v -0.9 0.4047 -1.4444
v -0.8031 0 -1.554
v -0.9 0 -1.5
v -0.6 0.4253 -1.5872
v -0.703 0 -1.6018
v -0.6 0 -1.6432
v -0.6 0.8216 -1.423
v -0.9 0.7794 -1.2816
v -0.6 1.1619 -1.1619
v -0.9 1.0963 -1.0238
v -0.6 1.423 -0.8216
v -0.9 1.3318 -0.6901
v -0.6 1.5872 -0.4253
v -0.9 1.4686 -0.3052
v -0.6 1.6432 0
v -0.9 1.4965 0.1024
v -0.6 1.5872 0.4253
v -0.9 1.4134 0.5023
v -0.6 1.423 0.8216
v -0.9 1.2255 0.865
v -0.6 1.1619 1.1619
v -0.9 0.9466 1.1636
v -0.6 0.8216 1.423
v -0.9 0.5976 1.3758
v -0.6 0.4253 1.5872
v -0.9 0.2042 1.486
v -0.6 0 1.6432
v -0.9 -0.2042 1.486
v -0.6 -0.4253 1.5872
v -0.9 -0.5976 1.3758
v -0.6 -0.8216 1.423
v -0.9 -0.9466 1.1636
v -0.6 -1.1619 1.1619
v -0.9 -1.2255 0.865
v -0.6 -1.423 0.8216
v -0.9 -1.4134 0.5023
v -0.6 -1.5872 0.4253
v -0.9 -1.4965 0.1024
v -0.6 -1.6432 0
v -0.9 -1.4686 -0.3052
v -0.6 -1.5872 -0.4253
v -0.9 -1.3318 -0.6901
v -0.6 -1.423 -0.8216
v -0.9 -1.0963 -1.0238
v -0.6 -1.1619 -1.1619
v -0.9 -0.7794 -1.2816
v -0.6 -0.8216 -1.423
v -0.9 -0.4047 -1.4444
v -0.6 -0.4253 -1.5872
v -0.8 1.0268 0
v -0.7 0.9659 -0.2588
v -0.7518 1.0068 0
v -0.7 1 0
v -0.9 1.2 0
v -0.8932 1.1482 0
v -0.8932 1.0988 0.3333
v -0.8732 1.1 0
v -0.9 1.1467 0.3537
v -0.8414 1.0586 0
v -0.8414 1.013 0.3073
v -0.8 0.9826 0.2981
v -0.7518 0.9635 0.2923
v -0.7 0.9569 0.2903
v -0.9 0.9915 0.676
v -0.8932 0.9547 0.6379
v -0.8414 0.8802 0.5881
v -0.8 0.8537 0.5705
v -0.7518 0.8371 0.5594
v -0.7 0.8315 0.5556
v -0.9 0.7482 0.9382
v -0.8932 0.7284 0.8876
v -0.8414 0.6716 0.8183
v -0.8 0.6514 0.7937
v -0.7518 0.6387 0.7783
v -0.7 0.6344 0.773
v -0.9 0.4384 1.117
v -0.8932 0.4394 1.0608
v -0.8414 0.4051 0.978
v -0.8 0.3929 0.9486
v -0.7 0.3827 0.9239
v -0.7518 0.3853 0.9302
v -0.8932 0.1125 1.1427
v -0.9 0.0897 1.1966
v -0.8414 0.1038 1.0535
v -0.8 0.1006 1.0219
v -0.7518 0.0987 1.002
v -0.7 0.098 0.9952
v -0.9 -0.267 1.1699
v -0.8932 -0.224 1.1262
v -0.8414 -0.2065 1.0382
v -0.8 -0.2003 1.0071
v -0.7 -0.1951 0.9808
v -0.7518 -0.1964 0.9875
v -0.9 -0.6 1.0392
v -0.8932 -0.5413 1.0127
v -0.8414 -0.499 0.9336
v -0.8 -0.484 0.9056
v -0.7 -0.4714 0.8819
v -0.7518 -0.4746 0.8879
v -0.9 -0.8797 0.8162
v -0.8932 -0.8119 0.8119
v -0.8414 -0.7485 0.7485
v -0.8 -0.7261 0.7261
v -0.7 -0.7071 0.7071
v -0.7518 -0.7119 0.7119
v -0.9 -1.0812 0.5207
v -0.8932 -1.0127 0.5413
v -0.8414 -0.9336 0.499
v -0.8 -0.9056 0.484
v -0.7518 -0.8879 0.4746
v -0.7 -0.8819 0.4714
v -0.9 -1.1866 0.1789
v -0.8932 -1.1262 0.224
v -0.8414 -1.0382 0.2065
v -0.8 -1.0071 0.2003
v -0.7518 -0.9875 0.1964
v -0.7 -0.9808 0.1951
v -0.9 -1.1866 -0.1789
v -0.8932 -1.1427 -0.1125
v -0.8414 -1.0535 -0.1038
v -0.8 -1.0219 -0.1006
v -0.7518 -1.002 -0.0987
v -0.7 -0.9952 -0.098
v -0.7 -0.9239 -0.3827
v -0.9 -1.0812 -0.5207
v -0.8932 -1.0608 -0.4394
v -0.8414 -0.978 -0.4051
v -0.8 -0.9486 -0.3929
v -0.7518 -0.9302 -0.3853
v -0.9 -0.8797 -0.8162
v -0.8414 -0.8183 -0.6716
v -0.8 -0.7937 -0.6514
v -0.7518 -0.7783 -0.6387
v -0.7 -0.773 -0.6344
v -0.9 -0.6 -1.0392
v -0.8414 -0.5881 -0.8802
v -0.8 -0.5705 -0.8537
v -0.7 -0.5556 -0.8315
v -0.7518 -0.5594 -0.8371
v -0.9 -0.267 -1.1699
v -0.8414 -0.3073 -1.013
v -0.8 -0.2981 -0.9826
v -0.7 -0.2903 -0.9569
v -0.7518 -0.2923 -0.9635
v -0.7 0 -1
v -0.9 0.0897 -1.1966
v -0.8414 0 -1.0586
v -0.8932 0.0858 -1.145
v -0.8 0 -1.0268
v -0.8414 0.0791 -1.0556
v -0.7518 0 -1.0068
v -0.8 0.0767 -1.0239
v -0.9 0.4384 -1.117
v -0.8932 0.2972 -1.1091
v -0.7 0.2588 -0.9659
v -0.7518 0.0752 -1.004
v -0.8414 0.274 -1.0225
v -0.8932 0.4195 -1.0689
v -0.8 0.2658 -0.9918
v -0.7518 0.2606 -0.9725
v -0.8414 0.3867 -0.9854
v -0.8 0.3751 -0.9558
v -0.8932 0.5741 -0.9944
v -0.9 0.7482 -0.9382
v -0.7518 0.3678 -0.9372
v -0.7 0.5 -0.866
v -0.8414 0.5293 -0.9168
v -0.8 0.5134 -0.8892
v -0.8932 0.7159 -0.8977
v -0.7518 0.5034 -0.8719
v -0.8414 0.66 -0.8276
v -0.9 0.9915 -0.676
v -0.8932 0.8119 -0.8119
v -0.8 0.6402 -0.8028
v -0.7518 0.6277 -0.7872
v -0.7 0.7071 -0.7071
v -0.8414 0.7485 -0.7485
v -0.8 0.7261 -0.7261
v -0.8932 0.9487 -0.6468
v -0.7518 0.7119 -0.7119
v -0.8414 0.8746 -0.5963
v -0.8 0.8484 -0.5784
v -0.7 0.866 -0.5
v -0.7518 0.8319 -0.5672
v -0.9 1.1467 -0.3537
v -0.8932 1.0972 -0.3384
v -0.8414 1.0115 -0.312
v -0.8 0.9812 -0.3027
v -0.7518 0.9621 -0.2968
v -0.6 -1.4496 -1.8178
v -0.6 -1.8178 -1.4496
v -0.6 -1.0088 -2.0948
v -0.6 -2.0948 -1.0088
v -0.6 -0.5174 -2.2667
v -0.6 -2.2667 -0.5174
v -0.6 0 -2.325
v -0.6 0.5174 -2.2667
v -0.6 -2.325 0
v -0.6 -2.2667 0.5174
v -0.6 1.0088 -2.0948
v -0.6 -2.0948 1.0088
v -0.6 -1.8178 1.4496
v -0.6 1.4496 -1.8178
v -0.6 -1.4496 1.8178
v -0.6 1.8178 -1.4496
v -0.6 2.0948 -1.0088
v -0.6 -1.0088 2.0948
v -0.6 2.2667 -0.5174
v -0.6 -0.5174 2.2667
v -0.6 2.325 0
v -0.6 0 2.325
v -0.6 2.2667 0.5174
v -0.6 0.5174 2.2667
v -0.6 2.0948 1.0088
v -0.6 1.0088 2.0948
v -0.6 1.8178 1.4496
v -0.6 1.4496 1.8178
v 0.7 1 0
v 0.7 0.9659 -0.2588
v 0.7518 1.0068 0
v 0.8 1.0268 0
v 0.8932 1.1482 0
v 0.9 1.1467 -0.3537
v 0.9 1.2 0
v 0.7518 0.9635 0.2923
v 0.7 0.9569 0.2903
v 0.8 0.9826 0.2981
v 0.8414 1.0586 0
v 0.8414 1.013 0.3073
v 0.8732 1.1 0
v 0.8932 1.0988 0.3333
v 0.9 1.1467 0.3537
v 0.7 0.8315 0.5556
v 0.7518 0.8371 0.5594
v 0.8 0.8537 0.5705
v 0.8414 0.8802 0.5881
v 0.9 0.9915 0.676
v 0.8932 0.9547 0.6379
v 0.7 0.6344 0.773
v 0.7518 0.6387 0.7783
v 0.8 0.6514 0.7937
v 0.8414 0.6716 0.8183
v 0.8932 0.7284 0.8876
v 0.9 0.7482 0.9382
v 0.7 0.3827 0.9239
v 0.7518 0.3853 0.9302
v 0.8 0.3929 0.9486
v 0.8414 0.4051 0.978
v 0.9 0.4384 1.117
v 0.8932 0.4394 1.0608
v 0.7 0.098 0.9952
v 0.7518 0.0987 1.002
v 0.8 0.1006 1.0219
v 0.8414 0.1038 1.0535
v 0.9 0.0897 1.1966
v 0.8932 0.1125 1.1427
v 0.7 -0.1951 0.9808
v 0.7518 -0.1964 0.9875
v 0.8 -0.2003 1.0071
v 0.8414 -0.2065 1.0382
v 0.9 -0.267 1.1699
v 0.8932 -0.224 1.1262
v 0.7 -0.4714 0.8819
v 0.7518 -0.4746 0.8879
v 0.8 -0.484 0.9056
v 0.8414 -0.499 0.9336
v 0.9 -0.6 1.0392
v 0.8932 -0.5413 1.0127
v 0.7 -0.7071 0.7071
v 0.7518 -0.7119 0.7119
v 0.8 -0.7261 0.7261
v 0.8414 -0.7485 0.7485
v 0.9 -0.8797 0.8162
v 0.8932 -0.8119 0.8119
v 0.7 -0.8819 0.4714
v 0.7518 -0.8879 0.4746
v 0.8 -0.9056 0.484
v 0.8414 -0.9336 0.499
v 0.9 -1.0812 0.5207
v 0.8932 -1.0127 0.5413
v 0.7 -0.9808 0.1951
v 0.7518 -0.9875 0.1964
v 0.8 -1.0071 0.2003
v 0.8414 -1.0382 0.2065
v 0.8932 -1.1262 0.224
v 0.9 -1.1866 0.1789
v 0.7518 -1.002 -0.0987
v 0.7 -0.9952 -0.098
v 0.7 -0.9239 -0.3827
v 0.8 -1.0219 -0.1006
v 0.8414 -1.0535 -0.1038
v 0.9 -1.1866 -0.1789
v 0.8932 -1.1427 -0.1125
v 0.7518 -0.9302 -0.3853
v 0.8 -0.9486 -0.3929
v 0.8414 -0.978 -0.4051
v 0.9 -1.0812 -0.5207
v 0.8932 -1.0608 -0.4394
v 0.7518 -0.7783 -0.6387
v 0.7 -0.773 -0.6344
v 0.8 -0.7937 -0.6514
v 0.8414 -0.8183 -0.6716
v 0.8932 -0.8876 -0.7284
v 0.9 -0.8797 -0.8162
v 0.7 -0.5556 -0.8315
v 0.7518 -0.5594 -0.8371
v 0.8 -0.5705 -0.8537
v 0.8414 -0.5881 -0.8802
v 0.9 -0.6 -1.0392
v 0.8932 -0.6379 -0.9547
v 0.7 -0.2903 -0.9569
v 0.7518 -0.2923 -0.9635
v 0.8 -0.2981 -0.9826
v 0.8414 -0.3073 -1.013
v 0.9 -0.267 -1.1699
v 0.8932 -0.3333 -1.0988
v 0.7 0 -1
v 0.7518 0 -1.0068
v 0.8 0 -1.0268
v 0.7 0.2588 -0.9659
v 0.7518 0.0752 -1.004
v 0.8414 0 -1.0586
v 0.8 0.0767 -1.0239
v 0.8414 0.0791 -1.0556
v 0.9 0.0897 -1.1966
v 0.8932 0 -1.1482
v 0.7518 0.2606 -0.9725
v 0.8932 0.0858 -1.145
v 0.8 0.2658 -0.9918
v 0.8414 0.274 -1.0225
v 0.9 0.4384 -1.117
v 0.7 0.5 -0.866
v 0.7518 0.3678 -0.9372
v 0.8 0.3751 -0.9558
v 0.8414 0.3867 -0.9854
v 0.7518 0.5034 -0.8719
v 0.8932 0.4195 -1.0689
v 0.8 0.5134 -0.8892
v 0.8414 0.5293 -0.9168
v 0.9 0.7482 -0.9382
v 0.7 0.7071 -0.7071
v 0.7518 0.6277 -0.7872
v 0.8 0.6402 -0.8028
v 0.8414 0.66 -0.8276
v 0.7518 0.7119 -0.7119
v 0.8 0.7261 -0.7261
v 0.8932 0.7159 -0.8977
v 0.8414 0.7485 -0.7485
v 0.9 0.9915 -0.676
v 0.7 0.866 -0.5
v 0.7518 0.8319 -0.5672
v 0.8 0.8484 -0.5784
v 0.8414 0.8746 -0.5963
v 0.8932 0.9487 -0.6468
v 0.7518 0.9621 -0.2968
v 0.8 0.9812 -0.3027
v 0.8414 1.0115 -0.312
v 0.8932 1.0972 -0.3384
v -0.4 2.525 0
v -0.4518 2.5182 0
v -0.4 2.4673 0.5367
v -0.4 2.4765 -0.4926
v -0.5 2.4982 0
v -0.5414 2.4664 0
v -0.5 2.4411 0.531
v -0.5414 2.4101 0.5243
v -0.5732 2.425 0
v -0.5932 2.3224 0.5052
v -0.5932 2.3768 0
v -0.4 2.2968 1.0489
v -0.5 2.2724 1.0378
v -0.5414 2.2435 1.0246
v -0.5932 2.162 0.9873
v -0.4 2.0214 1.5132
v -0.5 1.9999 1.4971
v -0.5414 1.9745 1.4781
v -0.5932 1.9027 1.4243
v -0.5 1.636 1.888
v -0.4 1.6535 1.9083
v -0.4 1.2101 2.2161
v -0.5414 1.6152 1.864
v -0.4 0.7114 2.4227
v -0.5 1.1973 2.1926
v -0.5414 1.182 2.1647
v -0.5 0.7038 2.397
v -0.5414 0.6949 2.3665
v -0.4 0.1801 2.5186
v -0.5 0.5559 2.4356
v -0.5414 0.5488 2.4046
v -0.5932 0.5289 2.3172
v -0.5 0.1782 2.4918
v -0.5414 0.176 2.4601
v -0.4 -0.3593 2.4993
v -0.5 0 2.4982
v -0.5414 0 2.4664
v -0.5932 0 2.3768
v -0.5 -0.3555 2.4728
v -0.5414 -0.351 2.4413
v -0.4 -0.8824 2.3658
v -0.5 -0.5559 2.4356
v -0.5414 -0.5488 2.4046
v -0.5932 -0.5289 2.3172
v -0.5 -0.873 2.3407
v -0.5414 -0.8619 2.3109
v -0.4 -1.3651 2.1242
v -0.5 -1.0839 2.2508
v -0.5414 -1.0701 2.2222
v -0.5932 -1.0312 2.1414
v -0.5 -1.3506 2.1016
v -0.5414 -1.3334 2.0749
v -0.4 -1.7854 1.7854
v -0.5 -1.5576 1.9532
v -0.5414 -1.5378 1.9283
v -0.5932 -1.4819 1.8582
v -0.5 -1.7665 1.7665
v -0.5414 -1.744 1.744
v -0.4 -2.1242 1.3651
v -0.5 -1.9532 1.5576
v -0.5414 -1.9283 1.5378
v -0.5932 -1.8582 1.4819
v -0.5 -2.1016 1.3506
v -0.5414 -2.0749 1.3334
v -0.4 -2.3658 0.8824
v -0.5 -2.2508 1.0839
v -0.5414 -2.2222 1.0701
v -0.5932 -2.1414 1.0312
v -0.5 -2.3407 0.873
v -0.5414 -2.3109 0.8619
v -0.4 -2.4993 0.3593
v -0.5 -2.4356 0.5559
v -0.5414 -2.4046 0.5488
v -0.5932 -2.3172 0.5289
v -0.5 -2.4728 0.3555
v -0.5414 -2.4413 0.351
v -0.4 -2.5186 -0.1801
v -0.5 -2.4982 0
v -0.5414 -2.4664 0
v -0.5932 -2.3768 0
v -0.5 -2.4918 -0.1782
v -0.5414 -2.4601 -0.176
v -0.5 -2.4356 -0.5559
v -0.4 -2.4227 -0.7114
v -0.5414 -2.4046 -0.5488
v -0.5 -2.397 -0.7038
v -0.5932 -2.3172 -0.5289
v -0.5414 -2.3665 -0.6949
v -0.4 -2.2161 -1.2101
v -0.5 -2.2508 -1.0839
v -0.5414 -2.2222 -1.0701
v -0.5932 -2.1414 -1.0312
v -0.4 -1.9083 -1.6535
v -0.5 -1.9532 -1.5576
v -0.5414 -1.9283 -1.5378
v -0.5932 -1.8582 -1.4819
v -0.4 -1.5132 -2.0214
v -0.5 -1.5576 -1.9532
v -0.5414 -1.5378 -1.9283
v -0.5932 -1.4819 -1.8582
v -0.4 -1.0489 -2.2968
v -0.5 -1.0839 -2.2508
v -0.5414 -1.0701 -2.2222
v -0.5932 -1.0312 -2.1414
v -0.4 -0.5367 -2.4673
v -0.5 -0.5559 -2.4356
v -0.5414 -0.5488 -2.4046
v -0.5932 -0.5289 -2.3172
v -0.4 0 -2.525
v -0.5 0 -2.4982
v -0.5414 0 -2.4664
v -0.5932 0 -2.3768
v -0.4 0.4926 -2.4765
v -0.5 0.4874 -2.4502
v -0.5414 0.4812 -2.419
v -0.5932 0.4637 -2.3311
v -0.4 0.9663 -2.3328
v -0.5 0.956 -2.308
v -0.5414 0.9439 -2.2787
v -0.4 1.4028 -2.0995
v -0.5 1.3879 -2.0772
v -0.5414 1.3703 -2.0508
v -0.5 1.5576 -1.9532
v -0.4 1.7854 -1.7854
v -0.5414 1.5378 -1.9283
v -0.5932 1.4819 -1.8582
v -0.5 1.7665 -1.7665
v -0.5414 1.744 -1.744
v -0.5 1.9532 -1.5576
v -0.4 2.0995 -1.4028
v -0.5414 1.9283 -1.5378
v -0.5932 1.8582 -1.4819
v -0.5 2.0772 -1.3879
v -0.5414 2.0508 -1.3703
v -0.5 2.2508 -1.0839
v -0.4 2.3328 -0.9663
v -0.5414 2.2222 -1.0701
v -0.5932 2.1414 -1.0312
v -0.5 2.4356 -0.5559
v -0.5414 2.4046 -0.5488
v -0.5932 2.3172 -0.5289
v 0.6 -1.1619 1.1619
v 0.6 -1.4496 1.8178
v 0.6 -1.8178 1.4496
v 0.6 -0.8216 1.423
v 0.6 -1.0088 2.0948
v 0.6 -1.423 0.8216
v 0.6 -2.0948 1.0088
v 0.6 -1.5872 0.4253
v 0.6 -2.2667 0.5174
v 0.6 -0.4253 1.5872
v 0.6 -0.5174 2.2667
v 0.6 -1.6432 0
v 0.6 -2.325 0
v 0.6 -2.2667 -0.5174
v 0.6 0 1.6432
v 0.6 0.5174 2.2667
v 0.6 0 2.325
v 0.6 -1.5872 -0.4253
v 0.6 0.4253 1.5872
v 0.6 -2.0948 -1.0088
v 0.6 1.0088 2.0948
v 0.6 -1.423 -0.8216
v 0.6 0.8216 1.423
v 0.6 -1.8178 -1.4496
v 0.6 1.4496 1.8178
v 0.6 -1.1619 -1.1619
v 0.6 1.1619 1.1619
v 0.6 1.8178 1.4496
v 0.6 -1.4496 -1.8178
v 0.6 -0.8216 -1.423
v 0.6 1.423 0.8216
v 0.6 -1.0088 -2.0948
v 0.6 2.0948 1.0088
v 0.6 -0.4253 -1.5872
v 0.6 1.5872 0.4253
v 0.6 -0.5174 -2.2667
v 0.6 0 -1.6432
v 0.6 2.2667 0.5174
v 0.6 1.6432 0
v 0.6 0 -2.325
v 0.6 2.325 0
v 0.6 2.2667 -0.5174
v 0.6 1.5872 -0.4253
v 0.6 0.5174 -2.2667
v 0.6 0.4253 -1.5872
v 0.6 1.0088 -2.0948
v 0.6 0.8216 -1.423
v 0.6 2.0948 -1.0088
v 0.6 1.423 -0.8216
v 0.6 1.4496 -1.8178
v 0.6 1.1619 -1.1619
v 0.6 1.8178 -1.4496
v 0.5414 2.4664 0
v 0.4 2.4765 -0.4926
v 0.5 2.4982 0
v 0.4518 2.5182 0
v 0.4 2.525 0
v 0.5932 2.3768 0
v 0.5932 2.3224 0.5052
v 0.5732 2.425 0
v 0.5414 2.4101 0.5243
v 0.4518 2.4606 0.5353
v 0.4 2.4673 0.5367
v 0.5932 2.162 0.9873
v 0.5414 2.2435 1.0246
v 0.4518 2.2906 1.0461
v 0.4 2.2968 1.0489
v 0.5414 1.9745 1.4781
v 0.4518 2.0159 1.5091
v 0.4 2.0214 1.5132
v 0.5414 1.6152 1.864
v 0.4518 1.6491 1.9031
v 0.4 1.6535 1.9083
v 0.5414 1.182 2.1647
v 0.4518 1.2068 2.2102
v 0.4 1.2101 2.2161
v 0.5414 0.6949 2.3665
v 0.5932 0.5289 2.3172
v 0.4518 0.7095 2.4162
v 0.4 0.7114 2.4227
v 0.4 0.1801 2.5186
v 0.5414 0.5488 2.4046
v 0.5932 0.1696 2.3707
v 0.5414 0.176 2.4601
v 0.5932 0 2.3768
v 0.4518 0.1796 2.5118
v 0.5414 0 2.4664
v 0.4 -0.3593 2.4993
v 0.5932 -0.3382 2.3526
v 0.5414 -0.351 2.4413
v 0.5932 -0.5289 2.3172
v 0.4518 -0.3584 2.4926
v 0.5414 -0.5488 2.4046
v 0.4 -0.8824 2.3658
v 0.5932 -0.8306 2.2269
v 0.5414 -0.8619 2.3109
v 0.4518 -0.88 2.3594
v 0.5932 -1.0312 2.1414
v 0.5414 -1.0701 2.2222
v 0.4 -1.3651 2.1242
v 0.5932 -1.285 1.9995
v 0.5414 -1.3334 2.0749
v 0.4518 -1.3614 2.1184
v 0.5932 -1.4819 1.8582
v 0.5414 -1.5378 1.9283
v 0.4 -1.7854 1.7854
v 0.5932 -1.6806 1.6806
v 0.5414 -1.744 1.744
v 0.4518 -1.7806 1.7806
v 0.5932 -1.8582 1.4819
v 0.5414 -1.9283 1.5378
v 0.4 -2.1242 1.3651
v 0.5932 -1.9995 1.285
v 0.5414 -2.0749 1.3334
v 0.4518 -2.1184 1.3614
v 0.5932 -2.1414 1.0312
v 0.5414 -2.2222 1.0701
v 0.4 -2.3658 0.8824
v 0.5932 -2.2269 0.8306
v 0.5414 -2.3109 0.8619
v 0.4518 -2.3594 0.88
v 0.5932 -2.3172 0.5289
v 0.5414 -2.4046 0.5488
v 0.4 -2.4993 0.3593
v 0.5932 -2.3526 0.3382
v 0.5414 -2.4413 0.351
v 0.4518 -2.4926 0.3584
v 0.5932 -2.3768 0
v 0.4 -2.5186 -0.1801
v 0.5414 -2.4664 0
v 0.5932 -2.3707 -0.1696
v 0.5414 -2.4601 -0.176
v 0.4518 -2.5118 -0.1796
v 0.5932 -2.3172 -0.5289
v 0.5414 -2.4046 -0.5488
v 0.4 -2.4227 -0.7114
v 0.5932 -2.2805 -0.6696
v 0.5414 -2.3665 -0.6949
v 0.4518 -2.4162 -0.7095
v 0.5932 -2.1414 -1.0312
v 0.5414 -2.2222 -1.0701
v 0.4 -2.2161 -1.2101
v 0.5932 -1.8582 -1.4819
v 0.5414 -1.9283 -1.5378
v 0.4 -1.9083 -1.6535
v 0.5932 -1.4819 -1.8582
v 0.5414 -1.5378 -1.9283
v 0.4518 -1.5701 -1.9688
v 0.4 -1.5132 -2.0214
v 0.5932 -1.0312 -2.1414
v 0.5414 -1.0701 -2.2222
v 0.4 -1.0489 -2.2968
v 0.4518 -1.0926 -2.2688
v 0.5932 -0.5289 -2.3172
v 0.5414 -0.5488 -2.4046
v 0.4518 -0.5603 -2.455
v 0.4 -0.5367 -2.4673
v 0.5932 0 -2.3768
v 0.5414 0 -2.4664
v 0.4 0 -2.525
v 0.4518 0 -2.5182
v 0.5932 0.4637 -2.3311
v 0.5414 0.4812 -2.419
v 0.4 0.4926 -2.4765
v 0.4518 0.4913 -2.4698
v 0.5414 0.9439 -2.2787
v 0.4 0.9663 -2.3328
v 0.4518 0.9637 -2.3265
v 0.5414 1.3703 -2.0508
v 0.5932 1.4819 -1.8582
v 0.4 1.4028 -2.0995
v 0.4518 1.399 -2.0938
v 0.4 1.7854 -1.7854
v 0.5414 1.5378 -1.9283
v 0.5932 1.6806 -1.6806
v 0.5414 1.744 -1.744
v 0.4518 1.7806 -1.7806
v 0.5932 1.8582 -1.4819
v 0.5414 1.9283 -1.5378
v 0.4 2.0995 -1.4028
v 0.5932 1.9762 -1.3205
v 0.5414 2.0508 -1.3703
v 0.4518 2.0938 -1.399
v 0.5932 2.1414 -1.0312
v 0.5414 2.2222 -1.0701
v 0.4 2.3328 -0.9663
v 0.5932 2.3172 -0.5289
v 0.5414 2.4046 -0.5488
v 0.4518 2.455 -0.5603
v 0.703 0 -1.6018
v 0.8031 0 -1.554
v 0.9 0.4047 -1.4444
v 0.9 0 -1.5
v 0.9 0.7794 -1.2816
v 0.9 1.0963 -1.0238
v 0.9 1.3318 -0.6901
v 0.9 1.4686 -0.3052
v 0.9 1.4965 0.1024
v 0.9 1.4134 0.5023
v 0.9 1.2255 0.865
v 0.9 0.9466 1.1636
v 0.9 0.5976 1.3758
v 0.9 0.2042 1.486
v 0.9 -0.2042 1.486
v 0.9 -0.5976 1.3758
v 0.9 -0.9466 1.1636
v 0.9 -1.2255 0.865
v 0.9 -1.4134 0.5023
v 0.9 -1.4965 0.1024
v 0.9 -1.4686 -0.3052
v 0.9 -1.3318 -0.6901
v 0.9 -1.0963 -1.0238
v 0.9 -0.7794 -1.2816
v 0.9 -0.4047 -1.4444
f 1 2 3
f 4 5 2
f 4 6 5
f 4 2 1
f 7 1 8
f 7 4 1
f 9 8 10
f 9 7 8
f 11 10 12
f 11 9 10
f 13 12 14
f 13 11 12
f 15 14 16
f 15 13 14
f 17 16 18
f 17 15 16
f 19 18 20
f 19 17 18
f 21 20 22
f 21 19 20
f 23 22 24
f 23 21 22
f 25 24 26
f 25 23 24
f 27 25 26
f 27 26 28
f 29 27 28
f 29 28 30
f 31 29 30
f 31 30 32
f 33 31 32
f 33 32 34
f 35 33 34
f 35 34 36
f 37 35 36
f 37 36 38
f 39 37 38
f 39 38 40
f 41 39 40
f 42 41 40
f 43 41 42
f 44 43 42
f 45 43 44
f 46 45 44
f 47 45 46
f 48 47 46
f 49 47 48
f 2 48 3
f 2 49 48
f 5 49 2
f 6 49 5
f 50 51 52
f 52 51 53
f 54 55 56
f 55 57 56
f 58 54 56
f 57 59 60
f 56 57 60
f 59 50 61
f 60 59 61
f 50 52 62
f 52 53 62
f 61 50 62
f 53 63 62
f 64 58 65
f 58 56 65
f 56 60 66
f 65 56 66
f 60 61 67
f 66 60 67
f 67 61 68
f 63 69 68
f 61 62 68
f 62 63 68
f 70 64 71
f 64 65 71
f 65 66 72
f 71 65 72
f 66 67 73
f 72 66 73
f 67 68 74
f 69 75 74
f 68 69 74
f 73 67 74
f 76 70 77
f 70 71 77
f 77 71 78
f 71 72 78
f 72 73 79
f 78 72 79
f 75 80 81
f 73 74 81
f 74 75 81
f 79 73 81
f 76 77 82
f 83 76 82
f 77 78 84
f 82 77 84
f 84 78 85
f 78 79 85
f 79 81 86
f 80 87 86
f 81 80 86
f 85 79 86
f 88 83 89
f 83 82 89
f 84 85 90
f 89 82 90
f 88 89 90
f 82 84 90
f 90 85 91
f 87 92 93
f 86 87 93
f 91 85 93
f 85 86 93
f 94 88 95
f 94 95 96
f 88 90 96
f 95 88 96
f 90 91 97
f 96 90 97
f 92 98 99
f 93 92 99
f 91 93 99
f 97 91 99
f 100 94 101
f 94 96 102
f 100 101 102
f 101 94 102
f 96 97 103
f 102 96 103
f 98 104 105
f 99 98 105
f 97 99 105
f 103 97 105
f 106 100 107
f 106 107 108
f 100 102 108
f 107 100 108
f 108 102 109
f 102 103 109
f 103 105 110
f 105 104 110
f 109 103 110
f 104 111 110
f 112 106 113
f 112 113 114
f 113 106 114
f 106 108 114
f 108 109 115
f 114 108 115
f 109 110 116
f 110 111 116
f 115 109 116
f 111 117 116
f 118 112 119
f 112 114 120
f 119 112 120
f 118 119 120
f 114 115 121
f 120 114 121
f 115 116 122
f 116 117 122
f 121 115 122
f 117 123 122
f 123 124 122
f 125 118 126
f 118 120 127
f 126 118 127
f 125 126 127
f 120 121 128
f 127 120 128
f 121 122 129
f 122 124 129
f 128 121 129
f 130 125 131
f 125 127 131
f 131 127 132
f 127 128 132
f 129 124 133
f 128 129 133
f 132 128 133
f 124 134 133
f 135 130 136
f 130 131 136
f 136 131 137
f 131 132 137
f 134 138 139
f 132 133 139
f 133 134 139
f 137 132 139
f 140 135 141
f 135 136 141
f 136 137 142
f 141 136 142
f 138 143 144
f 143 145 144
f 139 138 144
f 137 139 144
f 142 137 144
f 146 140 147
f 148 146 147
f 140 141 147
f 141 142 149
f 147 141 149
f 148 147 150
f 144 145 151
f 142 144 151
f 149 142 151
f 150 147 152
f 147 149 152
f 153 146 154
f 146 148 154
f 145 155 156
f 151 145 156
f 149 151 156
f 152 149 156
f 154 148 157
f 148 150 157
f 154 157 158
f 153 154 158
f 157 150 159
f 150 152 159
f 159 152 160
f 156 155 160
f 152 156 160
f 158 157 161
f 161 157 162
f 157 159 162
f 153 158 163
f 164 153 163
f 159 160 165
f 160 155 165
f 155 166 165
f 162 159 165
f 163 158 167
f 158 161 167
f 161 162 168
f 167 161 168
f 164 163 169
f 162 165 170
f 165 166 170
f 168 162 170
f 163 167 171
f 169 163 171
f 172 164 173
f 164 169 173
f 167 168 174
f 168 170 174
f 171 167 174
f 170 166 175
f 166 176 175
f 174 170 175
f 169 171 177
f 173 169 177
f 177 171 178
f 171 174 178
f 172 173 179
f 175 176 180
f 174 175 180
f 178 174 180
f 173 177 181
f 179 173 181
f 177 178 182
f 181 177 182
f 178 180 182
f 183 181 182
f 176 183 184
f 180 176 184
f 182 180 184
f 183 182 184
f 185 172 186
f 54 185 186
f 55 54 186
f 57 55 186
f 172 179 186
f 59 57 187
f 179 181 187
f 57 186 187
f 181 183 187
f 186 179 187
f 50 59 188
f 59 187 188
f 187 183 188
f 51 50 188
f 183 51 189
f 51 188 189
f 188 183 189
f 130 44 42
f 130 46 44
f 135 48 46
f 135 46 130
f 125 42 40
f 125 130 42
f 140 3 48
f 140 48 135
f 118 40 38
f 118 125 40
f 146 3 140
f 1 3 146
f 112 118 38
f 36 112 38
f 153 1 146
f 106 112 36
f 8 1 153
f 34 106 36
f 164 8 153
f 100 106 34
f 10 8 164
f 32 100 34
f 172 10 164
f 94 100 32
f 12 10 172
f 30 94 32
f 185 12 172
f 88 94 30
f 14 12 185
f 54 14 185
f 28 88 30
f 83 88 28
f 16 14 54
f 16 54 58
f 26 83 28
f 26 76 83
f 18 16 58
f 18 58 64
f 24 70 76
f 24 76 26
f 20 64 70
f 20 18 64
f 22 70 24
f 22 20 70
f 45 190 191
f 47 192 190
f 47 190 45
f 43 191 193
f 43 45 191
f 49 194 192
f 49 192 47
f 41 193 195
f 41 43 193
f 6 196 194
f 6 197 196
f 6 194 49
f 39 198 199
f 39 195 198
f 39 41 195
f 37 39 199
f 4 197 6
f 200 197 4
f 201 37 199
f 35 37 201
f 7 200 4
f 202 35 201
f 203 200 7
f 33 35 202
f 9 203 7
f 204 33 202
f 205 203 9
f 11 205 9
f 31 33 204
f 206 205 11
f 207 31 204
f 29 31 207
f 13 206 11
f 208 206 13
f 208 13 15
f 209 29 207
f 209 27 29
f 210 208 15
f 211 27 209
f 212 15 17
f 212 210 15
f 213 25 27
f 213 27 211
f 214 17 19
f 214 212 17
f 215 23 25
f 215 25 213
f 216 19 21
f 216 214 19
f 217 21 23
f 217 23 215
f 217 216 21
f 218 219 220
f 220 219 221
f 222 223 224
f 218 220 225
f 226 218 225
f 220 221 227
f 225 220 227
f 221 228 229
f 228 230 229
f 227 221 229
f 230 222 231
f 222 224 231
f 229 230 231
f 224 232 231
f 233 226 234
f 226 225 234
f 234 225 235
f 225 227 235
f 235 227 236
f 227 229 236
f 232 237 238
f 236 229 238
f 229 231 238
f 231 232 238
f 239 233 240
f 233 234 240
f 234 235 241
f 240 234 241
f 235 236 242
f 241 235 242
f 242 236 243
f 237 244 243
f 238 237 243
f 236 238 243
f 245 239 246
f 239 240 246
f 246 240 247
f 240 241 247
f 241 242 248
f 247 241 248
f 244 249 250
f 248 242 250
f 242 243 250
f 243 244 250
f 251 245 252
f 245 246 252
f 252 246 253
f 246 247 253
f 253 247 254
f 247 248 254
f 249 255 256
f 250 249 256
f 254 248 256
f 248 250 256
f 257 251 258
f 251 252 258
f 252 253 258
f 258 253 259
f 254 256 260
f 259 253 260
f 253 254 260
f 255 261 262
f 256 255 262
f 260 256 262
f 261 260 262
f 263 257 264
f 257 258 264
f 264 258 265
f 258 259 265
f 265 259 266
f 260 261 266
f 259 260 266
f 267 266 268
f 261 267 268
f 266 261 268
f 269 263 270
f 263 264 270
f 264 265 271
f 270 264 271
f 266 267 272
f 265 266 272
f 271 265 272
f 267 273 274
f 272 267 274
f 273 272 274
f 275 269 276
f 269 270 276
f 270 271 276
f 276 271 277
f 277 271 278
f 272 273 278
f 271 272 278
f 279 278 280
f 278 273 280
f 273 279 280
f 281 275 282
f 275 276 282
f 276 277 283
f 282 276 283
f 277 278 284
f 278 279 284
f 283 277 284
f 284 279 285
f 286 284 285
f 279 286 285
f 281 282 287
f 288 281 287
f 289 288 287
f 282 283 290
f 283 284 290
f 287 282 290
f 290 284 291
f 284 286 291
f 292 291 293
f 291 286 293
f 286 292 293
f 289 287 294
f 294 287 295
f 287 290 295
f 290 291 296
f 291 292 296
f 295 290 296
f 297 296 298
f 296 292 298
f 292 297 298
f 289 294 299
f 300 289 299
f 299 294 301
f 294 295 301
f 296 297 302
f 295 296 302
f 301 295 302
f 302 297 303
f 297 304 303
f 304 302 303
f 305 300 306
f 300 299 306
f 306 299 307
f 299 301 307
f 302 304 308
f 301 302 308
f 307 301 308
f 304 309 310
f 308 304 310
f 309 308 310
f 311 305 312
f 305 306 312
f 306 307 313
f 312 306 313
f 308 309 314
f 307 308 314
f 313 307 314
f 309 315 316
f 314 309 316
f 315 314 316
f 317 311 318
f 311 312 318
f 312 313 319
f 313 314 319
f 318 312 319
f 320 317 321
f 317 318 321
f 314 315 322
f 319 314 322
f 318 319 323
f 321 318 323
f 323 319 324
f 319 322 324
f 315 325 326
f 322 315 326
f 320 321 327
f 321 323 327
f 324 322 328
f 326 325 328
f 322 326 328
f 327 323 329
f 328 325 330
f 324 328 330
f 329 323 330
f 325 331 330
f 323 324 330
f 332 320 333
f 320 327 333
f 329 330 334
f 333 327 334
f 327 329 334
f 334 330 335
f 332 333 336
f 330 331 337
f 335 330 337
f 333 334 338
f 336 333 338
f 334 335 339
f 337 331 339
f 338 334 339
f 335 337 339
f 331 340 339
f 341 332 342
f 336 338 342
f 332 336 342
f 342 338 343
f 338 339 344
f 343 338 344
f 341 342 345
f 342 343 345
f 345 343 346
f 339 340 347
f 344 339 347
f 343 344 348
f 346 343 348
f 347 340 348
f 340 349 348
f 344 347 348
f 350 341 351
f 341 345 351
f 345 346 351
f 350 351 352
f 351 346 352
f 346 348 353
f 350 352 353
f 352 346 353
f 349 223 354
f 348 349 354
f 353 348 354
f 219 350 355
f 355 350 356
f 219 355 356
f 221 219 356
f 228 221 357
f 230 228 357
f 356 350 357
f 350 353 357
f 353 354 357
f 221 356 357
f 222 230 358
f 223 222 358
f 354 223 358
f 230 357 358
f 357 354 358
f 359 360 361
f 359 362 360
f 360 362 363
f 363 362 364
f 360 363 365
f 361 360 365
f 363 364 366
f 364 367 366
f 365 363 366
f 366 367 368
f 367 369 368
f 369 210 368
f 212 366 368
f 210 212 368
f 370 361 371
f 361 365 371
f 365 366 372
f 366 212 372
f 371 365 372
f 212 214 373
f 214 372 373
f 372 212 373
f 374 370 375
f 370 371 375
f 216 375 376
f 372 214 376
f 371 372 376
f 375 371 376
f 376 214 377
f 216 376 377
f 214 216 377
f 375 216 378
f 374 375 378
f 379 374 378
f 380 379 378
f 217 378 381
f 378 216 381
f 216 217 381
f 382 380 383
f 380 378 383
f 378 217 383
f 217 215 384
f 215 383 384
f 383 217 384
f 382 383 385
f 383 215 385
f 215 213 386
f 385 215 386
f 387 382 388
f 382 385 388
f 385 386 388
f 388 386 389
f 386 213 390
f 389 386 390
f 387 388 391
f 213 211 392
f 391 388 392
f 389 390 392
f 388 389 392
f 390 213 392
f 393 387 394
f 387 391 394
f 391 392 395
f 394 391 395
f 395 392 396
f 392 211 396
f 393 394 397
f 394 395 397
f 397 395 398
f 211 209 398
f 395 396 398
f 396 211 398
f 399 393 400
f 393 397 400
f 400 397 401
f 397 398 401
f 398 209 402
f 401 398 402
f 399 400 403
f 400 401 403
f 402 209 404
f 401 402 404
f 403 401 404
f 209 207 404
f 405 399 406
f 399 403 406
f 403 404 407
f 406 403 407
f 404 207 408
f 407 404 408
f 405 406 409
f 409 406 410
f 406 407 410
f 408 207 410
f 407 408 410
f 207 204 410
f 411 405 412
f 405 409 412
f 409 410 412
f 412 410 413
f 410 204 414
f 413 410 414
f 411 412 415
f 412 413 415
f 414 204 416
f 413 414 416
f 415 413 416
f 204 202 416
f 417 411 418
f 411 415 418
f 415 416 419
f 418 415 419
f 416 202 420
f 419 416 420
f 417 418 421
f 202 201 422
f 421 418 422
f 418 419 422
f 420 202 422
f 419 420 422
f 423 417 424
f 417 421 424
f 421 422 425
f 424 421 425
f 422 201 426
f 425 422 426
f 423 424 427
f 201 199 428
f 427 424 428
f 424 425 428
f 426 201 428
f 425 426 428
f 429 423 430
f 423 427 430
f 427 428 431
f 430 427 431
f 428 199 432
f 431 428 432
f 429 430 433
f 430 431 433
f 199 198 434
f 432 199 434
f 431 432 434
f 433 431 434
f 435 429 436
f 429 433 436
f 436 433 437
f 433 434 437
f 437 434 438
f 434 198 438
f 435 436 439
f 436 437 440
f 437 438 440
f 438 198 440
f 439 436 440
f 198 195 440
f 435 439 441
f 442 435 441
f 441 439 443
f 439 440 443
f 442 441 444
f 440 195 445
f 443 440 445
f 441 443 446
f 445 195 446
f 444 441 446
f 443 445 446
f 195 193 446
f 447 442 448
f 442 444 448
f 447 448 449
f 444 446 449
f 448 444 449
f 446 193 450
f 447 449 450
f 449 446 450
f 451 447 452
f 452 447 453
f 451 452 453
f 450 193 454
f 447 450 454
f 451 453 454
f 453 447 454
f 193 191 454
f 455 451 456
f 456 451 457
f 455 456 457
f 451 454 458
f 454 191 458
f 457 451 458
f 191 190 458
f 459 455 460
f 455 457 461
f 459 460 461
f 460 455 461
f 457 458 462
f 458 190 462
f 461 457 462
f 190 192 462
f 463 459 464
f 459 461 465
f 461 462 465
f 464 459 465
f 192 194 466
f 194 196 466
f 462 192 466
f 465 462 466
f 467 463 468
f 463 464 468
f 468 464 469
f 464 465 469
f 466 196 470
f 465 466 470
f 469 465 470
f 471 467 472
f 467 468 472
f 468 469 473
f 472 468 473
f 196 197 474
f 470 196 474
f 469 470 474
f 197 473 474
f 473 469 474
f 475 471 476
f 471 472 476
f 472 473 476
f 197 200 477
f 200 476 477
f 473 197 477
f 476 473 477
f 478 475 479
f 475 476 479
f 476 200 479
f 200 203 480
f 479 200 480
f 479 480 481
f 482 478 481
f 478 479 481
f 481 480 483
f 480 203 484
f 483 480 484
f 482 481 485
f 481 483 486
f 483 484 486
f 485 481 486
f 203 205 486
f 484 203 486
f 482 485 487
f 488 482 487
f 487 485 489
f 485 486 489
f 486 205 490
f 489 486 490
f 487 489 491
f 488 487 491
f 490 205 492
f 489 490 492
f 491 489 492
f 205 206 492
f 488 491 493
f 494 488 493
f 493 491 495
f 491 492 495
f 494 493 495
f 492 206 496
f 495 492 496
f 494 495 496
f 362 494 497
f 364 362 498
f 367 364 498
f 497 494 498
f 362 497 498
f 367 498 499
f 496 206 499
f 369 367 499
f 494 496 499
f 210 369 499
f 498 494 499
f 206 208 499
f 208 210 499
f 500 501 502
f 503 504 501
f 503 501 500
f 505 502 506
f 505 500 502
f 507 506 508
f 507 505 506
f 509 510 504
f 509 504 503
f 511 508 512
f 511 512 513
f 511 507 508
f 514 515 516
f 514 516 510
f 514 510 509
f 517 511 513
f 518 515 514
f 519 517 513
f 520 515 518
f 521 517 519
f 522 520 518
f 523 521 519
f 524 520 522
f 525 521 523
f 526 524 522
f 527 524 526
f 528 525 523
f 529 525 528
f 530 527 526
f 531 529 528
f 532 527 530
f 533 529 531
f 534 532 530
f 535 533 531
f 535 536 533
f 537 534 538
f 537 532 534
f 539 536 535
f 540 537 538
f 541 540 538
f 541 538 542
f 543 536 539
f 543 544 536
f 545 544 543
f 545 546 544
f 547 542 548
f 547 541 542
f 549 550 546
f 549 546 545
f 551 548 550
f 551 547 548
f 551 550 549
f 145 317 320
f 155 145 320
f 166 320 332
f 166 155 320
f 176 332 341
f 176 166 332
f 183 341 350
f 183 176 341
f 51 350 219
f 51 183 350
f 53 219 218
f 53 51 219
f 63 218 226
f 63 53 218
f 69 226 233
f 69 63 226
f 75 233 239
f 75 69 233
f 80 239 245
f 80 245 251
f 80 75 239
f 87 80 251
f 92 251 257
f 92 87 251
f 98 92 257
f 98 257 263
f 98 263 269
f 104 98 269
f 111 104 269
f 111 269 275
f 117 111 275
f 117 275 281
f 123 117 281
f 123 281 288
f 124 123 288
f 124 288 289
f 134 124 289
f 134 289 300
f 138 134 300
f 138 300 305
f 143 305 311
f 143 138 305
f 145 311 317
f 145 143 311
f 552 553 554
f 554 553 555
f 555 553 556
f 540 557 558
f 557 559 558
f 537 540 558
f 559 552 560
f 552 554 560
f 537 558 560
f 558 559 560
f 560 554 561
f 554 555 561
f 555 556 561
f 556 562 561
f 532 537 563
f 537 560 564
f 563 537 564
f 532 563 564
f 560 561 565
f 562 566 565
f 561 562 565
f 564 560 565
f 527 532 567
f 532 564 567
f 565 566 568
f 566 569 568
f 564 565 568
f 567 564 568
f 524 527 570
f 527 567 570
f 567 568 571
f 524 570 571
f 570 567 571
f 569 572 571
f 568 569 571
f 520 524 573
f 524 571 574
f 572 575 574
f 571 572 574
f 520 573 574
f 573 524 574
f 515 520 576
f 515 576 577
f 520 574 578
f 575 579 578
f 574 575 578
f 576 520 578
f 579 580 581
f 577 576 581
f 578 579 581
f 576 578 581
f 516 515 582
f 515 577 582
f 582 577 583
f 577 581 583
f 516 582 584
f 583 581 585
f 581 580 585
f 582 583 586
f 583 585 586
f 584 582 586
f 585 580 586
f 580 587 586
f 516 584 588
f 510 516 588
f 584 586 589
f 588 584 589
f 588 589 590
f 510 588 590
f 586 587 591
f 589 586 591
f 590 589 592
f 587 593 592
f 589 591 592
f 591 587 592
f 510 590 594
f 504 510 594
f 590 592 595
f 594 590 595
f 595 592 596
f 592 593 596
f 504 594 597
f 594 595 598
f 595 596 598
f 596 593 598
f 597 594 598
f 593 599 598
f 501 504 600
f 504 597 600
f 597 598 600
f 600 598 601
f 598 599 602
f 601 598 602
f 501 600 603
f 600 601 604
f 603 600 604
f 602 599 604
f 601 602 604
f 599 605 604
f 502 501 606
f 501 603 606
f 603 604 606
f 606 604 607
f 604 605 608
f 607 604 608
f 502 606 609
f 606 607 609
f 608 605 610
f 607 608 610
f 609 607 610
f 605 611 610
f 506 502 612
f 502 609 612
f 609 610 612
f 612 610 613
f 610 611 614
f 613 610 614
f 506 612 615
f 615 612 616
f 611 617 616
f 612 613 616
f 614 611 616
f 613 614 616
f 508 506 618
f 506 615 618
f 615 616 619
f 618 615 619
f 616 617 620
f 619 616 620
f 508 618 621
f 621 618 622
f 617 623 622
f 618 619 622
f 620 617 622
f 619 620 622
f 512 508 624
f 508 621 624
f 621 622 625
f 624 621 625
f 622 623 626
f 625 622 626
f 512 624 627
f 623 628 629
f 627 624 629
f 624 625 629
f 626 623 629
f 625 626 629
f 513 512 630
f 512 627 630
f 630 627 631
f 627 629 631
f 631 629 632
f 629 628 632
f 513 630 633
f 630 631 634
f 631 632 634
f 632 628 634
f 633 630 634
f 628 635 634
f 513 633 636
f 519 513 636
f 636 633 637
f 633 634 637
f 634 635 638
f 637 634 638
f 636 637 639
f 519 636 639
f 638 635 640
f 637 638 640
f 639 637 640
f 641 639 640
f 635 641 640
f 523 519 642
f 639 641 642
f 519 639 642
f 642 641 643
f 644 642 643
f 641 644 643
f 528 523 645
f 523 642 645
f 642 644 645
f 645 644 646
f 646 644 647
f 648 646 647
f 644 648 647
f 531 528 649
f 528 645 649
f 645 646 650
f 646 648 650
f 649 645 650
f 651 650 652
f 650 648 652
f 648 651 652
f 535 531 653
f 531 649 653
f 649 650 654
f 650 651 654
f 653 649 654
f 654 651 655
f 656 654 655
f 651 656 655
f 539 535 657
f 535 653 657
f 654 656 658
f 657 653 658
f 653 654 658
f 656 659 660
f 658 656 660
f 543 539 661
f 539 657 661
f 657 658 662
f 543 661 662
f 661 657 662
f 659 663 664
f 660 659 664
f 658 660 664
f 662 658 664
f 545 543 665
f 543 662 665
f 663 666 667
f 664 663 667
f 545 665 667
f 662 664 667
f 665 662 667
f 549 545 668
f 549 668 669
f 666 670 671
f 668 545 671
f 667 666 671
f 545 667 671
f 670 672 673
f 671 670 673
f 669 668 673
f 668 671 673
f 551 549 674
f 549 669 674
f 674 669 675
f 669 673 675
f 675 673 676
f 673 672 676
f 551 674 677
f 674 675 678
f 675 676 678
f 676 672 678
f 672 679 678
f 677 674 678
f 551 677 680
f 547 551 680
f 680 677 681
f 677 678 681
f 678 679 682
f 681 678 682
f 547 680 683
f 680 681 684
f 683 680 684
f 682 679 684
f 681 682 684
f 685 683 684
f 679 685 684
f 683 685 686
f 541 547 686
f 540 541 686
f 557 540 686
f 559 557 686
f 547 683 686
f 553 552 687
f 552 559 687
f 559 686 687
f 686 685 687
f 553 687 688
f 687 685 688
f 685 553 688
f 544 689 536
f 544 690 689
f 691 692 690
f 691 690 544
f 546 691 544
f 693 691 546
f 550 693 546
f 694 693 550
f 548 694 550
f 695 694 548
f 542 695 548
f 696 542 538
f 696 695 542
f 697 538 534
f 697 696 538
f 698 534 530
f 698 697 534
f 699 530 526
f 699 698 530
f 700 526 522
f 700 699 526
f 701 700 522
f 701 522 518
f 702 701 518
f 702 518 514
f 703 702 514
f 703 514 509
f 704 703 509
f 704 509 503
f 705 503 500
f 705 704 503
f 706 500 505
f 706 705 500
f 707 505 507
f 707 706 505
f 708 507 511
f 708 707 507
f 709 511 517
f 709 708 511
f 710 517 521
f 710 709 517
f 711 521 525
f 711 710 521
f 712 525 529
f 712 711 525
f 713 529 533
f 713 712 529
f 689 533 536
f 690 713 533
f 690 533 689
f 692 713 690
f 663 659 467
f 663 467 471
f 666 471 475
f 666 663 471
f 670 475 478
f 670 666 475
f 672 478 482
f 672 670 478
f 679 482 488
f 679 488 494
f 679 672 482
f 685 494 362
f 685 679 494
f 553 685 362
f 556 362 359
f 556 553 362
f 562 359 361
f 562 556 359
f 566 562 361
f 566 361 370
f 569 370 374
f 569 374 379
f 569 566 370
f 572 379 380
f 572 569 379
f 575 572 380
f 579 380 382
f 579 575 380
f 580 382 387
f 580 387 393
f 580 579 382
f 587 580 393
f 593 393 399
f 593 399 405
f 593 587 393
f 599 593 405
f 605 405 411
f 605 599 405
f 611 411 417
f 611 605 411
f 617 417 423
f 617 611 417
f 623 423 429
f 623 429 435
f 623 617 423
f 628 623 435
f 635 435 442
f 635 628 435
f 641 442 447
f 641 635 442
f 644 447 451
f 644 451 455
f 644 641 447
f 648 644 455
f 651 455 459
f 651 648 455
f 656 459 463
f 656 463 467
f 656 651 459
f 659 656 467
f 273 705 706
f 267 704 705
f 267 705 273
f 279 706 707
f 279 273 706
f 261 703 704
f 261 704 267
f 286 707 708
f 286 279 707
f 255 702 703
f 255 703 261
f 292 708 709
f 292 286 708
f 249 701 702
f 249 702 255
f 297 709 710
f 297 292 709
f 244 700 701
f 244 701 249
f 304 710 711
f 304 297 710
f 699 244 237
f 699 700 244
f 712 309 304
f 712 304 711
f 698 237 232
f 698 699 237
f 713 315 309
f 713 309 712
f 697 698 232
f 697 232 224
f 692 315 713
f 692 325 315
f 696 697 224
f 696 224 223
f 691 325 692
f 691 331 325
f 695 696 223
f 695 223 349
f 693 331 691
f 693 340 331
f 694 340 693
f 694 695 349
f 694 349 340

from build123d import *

# Parameters (mm, degrees)
FILLET1_R = 0.2


with BuildPart() as part:
    # Sketch1 → Revolve1 (revolve)
    with BuildSketch(Plane(origin=(0, 0, 0), x_dir=(1, 0, 0), z_dir=(0, 1, 0))):
        with BuildLine():
            Line((0.6, 2.525), (-0.6, 2.525))
            Line((-0.6, 2.525), (-0.6, 1.643167673))
            ThreePointArc((-0.6, 1.643167673), (-0.753408419, 1.578725991), (-0.9, 1.5))
            Line((-0.9, 1.5), (-0.9, 1))
            Line((-0.9, 1), (0.9, 1))
            Line((0.9, 1), (0.9, 1.5))
            ThreePointArc((0.9, 1.5), (0.753408419, 1.578725991), (0.6, 1.643167673))
            Line((0.6, 1.643167673), (0.6, 2.525))
        make_face()
    revolve(axis=Axis((0, 0, 0), (1, 0, 0)))

    # Fillet1
    fillet1_edges = [part.edges().sort_by_distance(p)[0] for p in [
        (-0.9, 0, 1),
        (0.9, 0, 1),
        (-0.6, 0, 2.525),
        (0.6, 0, 2.525),
    ]]
    fillet(fillet1_edges, radius=FILLET1_R)


solid = part.part
